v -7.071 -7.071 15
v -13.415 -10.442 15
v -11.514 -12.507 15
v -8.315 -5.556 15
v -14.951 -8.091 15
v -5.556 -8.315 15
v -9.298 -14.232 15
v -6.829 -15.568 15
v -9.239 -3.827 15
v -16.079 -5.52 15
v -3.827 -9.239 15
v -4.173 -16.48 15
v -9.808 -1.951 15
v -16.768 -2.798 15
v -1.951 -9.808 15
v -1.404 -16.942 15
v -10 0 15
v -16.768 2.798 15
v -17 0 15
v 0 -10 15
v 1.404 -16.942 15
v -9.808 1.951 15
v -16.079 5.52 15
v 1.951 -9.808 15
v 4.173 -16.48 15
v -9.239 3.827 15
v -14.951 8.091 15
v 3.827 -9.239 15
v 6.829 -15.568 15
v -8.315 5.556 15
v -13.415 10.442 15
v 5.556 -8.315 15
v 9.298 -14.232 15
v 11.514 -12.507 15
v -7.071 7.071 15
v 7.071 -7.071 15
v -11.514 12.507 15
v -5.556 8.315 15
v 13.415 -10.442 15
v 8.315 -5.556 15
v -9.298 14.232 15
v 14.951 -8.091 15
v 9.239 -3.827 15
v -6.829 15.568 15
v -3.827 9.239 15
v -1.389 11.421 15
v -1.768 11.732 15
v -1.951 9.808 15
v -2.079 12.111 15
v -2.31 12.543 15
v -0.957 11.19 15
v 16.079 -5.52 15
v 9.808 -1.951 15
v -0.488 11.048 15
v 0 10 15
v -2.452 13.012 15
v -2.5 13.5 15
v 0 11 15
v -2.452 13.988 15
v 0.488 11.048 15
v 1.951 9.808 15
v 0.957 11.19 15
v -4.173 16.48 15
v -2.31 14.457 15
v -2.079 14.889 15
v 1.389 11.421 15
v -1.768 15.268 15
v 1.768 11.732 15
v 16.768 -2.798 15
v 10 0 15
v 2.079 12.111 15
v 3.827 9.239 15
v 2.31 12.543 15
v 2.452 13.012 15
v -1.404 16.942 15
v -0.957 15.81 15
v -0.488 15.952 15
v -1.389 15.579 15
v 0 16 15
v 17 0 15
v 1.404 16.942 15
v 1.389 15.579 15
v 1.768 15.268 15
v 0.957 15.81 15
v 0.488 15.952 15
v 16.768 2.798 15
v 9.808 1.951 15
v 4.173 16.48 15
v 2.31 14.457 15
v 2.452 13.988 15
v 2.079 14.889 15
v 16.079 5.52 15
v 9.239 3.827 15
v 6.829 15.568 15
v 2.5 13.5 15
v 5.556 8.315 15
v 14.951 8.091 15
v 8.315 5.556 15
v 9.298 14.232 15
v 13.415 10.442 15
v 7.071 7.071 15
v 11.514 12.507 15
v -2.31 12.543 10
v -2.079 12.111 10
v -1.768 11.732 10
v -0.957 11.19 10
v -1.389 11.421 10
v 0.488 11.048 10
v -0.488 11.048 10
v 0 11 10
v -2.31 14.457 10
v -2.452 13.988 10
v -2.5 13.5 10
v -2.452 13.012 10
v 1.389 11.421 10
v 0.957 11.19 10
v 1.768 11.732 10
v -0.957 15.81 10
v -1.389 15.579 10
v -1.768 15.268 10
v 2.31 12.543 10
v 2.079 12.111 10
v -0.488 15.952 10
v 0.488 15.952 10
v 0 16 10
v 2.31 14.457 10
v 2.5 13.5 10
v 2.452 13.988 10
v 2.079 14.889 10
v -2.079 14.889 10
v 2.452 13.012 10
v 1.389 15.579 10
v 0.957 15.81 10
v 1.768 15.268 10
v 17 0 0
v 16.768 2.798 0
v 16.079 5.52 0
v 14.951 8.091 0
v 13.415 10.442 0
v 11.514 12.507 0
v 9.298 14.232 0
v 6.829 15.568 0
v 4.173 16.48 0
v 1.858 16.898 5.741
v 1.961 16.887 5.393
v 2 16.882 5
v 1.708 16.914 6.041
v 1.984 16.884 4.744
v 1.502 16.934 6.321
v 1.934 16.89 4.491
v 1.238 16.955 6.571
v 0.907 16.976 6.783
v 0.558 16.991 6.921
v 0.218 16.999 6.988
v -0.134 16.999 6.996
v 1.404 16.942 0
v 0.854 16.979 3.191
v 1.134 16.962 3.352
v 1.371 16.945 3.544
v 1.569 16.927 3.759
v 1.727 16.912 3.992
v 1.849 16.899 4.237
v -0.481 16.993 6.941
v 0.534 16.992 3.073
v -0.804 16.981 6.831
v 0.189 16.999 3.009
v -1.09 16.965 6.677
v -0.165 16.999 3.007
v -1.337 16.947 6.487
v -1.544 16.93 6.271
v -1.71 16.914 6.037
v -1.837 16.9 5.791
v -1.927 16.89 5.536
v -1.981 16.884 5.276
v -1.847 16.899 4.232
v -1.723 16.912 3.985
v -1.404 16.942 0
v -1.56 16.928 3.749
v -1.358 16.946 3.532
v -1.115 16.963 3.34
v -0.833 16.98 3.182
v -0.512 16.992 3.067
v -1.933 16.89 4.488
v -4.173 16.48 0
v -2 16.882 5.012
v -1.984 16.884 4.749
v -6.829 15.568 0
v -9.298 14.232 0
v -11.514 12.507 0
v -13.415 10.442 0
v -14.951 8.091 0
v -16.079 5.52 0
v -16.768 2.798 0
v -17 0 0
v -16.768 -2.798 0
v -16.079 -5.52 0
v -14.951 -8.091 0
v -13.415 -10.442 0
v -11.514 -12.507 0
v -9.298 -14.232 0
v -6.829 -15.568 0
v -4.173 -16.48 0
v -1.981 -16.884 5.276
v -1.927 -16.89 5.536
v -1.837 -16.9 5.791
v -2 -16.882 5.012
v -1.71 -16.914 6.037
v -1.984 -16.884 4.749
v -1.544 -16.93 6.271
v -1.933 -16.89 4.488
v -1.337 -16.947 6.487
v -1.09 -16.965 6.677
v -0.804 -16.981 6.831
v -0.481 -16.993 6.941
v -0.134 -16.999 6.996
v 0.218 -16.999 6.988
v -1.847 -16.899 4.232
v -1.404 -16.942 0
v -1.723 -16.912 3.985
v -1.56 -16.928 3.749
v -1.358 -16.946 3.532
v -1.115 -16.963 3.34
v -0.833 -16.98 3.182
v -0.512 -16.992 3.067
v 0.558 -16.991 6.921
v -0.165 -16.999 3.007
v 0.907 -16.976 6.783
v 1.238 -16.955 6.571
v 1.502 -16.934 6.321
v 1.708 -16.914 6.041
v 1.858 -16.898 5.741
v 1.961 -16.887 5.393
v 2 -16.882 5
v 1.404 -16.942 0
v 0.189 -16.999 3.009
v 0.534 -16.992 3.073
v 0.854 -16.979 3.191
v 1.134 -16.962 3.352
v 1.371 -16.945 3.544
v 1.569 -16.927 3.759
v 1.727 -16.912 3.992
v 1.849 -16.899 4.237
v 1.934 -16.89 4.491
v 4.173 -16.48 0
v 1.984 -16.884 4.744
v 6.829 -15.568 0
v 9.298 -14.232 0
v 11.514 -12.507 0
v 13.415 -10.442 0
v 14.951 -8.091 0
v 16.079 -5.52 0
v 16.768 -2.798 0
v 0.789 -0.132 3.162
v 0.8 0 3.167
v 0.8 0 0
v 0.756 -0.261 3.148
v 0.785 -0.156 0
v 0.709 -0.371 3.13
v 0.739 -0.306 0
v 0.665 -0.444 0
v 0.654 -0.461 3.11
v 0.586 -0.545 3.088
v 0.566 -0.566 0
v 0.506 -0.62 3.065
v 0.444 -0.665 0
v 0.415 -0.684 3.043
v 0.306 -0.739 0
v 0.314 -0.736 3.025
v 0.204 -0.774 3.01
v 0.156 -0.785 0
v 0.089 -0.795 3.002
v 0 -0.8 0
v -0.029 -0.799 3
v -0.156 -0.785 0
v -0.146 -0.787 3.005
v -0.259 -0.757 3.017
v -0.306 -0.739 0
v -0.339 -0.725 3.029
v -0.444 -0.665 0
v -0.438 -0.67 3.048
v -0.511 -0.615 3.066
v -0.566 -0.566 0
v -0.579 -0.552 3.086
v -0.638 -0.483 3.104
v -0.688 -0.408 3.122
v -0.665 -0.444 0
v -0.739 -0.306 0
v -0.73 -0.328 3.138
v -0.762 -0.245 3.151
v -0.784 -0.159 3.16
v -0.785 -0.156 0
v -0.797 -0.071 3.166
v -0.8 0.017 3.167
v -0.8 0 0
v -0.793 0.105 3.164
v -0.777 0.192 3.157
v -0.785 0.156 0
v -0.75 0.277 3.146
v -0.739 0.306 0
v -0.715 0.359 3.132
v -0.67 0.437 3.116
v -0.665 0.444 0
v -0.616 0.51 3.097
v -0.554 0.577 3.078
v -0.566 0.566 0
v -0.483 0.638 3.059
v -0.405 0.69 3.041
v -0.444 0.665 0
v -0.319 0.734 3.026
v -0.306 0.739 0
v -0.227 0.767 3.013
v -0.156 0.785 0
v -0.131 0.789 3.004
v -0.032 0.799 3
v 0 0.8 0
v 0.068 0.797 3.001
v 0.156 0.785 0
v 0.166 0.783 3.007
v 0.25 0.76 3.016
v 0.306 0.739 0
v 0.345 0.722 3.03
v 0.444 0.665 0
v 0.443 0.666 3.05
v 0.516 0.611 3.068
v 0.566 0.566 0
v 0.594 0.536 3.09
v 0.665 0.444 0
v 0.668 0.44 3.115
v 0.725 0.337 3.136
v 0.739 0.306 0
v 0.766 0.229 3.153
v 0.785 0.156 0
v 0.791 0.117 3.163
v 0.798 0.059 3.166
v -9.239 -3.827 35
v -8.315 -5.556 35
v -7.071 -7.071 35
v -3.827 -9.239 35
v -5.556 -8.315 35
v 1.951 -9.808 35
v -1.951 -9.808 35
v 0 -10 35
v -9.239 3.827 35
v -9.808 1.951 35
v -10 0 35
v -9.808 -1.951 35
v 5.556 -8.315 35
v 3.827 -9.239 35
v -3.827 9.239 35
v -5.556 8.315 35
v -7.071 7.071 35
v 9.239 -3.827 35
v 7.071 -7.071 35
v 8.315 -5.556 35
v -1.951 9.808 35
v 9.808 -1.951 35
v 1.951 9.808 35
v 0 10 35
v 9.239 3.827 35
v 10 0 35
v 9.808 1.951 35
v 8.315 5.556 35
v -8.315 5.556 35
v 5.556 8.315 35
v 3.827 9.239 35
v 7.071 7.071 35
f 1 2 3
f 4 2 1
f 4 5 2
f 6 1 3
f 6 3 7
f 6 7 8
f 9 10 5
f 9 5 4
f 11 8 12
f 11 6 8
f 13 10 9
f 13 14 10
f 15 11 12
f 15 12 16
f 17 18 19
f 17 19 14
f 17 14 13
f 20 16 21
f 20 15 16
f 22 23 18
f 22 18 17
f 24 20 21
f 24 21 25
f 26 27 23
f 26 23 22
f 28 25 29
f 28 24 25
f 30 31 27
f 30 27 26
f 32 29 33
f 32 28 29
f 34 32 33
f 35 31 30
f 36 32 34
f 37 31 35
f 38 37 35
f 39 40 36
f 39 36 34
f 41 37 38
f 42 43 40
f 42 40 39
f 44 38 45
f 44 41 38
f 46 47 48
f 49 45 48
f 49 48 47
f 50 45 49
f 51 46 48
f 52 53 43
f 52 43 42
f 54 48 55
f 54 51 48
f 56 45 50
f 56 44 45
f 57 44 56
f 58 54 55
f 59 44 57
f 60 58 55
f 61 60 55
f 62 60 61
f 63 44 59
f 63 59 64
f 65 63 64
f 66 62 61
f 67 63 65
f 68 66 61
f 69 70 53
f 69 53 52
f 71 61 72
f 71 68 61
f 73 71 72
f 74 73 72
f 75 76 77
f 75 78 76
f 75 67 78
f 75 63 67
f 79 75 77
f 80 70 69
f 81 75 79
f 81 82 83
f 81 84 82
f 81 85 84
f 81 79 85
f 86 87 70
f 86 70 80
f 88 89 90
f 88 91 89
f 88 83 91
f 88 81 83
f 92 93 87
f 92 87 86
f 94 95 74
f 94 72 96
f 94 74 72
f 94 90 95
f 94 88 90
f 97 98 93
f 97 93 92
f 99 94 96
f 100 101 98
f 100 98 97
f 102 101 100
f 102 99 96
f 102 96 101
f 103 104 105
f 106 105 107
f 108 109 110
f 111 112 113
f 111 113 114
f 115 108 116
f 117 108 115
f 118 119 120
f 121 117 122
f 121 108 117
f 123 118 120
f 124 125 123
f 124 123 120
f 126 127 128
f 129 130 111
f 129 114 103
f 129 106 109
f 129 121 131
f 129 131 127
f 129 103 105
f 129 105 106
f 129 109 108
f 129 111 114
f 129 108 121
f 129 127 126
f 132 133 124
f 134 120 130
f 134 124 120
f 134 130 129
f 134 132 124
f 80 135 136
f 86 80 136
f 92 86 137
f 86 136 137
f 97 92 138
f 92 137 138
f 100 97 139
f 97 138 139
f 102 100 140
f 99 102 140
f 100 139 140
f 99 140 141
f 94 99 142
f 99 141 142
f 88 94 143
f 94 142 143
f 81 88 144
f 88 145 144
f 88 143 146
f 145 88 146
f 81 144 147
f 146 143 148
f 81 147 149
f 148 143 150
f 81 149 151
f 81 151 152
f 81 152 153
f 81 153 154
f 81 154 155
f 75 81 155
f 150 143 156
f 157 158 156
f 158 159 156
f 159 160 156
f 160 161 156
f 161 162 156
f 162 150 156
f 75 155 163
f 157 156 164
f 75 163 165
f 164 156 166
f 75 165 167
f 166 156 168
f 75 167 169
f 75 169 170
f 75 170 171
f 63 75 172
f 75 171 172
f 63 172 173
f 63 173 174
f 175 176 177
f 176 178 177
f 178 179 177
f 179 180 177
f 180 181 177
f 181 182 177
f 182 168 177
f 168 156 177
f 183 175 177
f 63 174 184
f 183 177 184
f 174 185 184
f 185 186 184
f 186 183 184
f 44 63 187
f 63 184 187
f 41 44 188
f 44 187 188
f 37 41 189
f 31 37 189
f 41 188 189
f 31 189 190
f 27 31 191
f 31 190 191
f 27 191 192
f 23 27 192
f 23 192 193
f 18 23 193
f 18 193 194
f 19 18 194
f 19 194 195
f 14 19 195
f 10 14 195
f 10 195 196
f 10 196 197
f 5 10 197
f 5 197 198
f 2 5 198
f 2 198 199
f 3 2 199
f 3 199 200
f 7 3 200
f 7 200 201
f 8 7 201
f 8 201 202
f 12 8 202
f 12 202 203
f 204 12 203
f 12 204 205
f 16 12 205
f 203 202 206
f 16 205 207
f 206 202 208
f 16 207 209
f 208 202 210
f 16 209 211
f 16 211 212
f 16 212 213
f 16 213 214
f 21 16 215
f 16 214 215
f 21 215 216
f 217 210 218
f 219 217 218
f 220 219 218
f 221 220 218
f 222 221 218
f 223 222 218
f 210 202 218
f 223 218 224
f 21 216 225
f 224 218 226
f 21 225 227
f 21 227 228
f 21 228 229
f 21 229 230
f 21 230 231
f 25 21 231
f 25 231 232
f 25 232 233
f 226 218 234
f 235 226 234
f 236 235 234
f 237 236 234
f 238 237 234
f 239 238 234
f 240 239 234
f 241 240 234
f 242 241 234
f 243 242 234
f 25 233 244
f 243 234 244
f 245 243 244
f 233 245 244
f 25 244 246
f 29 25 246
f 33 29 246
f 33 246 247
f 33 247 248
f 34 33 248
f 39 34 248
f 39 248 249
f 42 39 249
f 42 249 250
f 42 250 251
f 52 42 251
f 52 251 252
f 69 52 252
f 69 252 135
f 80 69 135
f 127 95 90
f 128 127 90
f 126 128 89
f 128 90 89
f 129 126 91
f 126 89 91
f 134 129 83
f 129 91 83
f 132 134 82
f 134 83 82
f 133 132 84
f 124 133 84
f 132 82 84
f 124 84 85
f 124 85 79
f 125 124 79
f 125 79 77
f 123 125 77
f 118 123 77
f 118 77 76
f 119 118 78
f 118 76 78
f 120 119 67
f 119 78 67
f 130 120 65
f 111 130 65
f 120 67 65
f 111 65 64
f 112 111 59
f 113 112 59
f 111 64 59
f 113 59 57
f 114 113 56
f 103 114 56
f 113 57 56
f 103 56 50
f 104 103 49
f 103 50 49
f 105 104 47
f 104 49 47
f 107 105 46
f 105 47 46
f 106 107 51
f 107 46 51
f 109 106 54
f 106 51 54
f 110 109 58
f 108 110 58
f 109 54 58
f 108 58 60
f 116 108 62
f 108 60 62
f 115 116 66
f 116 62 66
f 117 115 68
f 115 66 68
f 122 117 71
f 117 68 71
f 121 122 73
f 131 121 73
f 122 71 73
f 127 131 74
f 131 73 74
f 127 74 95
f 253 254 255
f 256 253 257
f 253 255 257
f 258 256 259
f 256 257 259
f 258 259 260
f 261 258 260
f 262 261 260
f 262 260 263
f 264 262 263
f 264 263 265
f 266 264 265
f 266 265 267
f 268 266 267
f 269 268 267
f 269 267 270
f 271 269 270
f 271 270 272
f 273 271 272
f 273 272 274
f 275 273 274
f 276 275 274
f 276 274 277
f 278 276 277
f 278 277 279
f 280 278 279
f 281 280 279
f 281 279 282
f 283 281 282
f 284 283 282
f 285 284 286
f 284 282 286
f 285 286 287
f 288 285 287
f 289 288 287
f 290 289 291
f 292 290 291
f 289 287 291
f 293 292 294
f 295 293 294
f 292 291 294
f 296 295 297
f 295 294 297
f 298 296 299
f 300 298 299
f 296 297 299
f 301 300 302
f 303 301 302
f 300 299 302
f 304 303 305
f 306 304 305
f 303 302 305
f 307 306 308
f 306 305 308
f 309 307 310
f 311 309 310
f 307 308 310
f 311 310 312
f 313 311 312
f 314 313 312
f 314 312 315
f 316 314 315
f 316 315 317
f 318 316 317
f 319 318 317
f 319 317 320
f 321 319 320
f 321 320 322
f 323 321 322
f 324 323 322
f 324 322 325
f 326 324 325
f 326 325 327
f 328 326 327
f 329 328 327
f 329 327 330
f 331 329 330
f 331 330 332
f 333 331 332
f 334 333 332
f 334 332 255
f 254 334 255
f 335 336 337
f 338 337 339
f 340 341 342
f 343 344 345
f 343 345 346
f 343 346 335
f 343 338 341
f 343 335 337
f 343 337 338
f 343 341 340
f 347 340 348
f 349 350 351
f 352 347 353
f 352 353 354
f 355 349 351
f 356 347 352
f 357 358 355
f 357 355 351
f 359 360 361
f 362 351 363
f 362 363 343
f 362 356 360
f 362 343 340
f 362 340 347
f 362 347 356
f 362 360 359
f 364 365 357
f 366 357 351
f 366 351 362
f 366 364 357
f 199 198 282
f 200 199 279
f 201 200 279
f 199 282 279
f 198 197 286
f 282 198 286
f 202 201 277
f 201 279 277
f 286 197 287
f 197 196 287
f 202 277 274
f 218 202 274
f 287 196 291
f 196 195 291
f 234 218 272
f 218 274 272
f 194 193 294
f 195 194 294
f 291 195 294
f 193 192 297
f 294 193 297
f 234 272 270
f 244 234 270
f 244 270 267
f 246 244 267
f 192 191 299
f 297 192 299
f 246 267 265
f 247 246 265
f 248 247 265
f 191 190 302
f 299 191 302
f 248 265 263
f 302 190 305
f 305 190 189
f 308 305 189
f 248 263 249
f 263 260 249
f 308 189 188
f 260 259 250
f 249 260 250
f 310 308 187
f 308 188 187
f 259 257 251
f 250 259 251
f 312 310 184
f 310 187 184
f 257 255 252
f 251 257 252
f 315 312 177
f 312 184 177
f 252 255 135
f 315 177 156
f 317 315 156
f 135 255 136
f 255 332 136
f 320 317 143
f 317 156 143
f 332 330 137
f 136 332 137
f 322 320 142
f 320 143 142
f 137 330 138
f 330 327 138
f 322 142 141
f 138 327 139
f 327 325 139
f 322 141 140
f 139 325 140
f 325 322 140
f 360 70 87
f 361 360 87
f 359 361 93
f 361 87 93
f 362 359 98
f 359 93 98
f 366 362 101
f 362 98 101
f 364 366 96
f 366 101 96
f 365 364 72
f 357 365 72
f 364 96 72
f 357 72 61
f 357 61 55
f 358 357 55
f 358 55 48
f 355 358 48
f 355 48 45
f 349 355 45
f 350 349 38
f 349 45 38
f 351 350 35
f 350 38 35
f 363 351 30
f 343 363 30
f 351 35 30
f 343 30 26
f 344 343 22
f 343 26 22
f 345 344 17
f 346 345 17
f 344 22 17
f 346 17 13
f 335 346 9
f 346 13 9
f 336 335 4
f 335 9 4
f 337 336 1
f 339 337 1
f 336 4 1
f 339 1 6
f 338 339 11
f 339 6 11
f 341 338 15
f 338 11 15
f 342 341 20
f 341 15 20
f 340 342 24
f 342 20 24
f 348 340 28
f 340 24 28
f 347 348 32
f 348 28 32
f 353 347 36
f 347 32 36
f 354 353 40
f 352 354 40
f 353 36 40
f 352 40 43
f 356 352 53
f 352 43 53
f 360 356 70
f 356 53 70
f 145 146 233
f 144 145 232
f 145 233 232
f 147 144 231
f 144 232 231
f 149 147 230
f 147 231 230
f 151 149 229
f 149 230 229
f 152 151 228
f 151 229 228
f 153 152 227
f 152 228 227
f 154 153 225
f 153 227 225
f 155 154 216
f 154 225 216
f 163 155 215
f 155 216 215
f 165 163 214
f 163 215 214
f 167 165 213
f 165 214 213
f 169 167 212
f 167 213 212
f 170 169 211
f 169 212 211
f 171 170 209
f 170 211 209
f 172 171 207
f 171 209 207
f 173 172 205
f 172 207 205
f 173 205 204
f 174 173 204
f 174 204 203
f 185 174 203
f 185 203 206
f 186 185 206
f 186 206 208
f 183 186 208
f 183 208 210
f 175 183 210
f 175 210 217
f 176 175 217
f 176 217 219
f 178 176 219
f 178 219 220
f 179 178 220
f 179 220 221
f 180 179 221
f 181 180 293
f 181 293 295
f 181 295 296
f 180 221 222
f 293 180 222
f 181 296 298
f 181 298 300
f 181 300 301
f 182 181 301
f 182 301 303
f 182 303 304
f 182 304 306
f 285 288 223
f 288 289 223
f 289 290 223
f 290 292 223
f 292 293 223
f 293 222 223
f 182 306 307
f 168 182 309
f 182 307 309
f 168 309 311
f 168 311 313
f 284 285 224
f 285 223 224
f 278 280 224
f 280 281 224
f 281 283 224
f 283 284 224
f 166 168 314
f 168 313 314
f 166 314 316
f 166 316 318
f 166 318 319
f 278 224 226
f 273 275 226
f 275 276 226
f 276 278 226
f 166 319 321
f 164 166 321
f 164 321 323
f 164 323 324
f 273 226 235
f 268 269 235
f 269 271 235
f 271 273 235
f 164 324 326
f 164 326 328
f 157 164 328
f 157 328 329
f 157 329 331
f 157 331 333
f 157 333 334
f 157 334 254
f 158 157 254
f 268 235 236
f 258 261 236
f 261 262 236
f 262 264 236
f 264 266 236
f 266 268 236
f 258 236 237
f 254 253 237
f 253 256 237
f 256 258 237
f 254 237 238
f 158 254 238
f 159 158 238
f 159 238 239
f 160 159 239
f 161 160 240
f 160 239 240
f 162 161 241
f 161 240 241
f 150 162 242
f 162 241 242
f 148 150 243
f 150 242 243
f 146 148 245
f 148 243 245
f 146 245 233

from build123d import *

# Parameters (mm, degrees)
F0_R      = 17
F1_DEPTH  = 15
F2_R      = 10
F3_DEPTH  = 20
F4_R      = 0.8
F5_DEPTH  = 5
F7_R      = 2
F8_DEPTH  = 42.001
F9_R      = 2.5
F10_DEPTH = 5


with BuildPart() as f1:
    # F0 (on Top) → F1 (new body)
    with BuildSketch(Plane.XY):
        Circle(F0_R)
    extrude(amount=F1_DEPTH)

    # F2 (on face) → F3 (join)
    with BuildSketch(Plane.XY.offset(15)):
        Circle(F2_R)
    extrude(amount=F3_DEPTH)

    # F4 (on face) → F5 (cut)
    with BuildSketch(Plane(origin=(0, 0, 0), x_dir=(1, 0, 0), z_dir=(0, 0, -1))):
        Circle(F4_R)
    extrude(amount=-F5_DEPTH, mode=Mode.SUBTRACT)

    # F7 (on offset) → F8 (cut, through all)
    with BuildSketch(Plane.XZ.offset(25)):
        with Locations((0, 5)):
            Circle(F7_R)
    extrude(amount=-F8_DEPTH, mode=Mode.SUBTRACT)

    # F9 (on face) → F10 (cut)
    with BuildSketch(Plane.XY.offset(15)):
        with Locations((0, 13.5)):
            Circle(F9_R)
    extrude(amount=-F10_DEPTH, mode=Mode.SUBTRACT)


solid = f1.part
